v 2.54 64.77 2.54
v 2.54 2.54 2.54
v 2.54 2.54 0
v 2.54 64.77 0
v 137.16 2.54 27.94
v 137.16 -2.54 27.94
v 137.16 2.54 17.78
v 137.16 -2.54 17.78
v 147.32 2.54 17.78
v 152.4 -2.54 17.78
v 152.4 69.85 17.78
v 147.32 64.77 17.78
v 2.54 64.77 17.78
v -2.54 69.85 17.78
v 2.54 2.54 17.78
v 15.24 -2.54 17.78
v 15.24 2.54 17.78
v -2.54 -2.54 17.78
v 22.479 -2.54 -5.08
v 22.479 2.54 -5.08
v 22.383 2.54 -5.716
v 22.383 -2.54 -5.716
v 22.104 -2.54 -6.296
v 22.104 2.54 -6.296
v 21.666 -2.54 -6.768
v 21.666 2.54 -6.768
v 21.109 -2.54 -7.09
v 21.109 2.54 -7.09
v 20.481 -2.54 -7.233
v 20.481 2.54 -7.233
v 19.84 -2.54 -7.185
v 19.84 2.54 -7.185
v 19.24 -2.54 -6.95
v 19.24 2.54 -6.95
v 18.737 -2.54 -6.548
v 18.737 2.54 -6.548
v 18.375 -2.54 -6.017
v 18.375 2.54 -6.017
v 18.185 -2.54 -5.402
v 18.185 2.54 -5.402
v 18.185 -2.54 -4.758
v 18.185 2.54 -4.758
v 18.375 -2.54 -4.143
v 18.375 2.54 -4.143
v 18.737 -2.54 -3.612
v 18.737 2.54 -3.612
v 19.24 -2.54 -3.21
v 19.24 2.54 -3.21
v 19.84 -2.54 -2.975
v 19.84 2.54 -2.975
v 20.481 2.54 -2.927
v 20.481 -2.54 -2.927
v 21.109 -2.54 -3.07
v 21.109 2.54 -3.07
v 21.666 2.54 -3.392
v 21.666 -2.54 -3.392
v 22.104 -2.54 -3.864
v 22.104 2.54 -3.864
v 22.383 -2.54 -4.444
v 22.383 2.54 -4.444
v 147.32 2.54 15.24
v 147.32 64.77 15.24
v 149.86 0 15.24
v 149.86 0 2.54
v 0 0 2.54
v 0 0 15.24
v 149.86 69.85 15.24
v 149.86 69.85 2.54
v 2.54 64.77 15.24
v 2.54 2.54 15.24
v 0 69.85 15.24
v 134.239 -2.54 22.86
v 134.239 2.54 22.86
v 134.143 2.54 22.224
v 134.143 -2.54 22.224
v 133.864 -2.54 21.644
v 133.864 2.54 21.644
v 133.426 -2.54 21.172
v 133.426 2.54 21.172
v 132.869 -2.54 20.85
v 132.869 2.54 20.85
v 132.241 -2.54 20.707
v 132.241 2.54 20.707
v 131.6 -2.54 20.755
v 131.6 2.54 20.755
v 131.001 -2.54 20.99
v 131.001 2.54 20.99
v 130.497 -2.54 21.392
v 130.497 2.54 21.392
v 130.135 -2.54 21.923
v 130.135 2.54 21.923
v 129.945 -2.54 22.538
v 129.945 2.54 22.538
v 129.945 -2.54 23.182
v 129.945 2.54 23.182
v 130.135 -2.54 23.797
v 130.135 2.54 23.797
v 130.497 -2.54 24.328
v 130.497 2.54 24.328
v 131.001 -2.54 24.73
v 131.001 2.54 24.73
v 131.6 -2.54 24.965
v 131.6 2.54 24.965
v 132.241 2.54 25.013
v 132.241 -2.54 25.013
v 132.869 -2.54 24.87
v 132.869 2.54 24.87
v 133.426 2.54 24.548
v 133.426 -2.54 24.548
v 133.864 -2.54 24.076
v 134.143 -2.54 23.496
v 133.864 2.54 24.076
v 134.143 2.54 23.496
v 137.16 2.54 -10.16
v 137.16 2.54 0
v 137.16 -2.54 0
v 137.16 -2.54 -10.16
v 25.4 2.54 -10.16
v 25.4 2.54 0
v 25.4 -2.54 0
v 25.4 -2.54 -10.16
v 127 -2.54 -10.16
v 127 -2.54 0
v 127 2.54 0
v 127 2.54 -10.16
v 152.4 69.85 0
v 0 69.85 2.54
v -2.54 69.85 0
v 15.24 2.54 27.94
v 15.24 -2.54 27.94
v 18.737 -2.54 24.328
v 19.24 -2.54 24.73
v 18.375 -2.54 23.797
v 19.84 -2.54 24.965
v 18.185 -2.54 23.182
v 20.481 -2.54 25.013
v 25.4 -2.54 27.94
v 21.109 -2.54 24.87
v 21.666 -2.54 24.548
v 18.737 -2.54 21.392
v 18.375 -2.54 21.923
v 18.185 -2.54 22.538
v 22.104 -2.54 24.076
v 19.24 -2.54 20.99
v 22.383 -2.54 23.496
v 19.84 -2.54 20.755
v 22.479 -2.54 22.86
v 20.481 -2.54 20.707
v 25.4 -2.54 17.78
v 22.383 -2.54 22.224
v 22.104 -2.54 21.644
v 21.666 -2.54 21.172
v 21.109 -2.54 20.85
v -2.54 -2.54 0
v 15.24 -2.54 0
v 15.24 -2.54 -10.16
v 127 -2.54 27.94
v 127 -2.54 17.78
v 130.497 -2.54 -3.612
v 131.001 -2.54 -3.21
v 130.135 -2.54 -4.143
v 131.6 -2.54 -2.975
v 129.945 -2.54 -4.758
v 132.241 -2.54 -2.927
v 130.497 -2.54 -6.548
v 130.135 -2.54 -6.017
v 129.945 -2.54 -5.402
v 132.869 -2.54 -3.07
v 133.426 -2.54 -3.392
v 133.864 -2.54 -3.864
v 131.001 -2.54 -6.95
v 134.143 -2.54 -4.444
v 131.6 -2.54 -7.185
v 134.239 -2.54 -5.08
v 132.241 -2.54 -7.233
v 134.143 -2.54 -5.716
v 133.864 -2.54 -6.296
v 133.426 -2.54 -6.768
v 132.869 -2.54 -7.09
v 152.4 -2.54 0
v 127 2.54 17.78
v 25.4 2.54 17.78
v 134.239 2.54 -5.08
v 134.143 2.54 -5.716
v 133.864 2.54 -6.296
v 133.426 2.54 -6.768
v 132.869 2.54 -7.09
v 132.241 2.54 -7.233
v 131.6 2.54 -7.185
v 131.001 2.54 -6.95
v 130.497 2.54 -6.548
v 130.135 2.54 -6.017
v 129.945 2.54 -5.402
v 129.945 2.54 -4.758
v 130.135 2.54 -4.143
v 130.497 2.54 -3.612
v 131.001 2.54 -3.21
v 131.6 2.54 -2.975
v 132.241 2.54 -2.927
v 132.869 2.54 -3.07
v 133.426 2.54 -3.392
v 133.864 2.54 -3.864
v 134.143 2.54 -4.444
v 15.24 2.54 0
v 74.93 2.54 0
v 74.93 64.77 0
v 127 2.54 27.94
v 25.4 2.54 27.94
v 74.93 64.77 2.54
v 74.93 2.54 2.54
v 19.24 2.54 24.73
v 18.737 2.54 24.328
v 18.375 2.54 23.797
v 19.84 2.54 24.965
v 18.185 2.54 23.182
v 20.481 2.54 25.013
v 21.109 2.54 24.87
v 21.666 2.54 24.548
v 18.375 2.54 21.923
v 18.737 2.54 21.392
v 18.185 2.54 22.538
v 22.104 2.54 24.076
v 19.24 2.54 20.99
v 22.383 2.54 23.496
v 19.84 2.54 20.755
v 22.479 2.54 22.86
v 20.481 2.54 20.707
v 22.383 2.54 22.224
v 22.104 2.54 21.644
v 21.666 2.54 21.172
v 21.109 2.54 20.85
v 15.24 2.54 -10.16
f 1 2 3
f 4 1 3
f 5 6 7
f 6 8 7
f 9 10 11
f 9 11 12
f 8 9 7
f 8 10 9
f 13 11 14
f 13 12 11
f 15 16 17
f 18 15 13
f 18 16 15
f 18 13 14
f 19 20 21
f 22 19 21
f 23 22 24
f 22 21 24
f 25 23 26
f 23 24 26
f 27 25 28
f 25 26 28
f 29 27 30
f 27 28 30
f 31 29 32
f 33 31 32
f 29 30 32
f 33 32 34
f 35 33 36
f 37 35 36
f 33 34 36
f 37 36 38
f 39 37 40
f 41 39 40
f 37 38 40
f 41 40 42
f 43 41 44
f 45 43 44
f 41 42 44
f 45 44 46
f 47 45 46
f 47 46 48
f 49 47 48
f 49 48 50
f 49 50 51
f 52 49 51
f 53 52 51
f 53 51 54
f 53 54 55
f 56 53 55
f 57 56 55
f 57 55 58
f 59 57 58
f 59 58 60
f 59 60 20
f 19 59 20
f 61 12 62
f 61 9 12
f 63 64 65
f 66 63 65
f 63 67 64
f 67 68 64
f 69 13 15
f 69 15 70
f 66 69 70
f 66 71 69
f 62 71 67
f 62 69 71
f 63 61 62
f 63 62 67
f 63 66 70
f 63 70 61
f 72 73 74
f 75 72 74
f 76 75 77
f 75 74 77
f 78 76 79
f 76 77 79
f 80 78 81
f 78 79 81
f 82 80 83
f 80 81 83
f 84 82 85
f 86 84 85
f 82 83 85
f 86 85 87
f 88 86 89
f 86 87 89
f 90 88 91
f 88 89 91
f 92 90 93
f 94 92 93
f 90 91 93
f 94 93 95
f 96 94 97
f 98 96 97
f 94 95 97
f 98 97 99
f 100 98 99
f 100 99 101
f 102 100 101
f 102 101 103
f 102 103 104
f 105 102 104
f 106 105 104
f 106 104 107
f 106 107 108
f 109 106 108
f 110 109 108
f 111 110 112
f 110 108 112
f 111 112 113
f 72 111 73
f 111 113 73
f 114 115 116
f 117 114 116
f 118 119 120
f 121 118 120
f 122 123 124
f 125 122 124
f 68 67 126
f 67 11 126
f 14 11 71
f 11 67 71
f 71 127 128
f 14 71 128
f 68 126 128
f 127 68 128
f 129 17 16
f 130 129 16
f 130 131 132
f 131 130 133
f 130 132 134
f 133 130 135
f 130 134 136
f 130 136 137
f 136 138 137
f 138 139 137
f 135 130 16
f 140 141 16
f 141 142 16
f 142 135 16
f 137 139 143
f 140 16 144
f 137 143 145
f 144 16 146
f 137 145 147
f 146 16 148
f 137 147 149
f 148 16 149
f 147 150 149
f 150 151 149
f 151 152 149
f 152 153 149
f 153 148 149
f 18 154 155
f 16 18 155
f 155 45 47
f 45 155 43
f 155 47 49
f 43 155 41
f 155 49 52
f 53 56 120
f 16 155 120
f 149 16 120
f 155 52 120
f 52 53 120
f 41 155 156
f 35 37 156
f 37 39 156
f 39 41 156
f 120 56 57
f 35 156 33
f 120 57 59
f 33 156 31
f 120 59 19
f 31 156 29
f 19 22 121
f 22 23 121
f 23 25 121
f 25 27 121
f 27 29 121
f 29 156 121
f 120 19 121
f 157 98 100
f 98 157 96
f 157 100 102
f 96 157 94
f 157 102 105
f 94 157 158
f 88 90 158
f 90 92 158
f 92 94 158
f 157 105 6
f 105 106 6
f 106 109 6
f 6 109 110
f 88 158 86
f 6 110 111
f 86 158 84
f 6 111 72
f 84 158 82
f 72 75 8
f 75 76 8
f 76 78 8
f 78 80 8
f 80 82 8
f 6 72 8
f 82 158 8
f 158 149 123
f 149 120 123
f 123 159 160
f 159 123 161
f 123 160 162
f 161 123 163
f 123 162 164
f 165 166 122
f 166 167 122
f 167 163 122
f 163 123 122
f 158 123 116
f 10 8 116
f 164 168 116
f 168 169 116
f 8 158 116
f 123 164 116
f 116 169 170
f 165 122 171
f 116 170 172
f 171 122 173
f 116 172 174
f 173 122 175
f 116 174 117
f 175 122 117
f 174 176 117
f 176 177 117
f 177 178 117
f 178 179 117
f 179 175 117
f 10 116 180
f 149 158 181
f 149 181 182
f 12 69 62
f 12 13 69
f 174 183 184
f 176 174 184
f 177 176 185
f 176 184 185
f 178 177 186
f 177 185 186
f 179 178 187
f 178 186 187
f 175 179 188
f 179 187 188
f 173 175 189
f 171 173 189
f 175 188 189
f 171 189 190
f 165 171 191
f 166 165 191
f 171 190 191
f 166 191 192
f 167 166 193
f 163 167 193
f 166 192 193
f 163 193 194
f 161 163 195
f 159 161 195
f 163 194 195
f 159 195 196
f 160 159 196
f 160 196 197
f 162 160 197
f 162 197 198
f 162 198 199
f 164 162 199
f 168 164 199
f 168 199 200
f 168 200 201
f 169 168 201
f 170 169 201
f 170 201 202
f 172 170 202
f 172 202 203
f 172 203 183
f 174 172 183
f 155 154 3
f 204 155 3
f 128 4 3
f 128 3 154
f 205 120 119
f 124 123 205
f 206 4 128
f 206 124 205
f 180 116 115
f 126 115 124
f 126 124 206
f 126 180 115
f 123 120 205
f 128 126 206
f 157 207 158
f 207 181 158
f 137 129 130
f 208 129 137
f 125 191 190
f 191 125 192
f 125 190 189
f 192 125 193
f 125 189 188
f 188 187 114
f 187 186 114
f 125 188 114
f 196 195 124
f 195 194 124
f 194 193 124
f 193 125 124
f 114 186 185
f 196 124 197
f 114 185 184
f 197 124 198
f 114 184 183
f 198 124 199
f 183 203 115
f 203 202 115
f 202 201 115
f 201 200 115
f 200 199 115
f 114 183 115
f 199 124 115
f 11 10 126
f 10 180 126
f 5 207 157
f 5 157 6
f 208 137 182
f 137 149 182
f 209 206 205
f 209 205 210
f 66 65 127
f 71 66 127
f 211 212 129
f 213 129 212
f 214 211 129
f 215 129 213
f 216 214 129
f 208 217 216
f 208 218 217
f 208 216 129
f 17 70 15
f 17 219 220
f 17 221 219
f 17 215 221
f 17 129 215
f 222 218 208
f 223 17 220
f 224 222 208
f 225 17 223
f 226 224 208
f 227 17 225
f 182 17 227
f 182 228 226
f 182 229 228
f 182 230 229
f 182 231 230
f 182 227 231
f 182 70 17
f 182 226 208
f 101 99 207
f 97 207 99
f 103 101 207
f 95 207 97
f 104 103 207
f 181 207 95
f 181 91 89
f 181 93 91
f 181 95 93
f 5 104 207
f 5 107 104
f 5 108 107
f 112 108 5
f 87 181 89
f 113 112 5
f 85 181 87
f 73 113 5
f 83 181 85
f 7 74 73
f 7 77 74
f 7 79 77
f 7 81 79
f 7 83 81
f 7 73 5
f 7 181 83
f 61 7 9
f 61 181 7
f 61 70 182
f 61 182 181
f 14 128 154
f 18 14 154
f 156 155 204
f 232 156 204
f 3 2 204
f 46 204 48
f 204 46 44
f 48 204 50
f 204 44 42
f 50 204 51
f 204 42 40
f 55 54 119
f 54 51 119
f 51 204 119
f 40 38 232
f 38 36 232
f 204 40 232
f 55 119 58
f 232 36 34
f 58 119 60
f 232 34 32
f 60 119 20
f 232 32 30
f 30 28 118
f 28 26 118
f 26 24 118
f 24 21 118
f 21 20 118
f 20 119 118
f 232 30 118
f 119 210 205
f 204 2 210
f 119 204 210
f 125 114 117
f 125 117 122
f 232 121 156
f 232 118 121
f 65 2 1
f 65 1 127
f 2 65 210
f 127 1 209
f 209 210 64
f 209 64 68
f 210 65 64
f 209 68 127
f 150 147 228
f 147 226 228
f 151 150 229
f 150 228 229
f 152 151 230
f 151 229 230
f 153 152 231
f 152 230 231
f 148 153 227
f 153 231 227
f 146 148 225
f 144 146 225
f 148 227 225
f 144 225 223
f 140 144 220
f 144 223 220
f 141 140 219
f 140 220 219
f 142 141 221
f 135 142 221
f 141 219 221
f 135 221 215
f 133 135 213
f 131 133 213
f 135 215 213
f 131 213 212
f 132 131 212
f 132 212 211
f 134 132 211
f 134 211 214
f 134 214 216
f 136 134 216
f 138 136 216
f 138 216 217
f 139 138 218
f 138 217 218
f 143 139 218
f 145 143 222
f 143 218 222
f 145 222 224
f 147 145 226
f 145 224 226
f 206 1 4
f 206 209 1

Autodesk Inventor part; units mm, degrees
ref_plane "YZ Plane" through (0, 0, 0) normal (1, 0, 0) x (0, 1, 0)
ref_plane "XZ Plane" through (0, 0, 0) normal (0, 1, 0) x (-1, 0, 0)
ref_plane "XY Plane" through (0, 0, 0) normal (0, 0, 1) x (1, 0, 0)
sketch "Sketch1" plane through (0, 0, 0) normal (0, 0, 1) x (1, 0, 0)
  line L0 (0, 0) -> (0, 67.31)
  line L1 (0, 67.31) -> (149.86, 67.31)
  line L2 (149.86, 67.31) -> (149.86, 0)
  line L3 (149.86, 0) -> (0, 0)
  line L4 (-2.54, 69.85) -> (-2.54, -2.54)
  line L5 (-2.54, -2.54) -> (152.4, -2.54)
  line L6 (152.4, -2.54) -> (152.4, 69.85)
  line L7 (152.4, 69.85) -> (-2.54, 69.85)
  dimension "d0" = 67.31
  dimension "d1" = 149.86
  dimension "d5" = 72.39
  dimension "d6" = 154.94
  dimension "d7" = 72.39
extrude "Extrusion1" add sketch "Sketch1" along normal blind 17.78
sketch "Sketch2" plane through (0, 0, 0) normal (1, 0, 0) x (0, 0, -1)
  line L0 (0, 0) -> (-2.54, 0)
  line L1 (0, 0) -> (-17.78, 0) projected
  line L2 (-2.54, 0) -> (-2.54, 67.31)
  line L3 (0, 67.31) -> (-17.78, 67.31) projected
  line L4 (-2.54, 67.31) -> (0, 67.31)
  line L5 (0, 67.31) -> (0, 0)
  line L6 (0, 67.31) -> (0, 0) projected
  dimension "d10" = 2.54
extrude "Extrusion2" add sketch "Sketch2" along normal blind 2.54
sketch "Sketch3" plane through (0, 0, 17.78) normal (0, 1, 0) x (1, 0, 0)
  line L0 (0, 15.24) -> (0, 0) projected
  line L1 (0, 2.54) -> (149.86, 2.54)
  line L2 (149.86, 2.54) -> (149.86, 0)
  line L3 (149.86, 0) -> (0, 0)
  line L4 (0, 0) -> (149.86, 0) projected
  point P0 (0, 17.78)
extrude "Extrusion3" add sketch "Sketch3" along normal blind 2.54
sketch "Sketch4" plane through (-2.54, 69.85, 0) normal (0, 1, 0) x (1, 0, 0)
  line L0 (2.54, -15.24) -> (2.54, -2.54)
  line L1 (2.54, -2.54) -> (2.54, -15.24) projected
  line L2 (2.54, -2.54) -> (152.4, -2.54)
  line L3 (152.4, 0) -> (152.4, -15.24) projected
  line L4 (152.4, -15.24) -> (2.54, -15.24)
  point P0 (2.54, 0)
extrude "Extrusion4" cut sketch "Sketch4" against normal blind 2.54
sketch "Sketch5" plane through (0, 67.31, 17.78) normal (0, -1, 0) x (1, 0, 0)
  line L0 (149.86, 0) -> (149.86, -2.54)
  line L1 (149.86, -2.54) -> (0, -2.54)
  line L2 (0, -2.54) -> (0, 0)
  line L3 (0, 0) -> (149.86, 0)
  point P0 (0, -17.78)
extrude "Extrusion5" add sketch "Sketch5" along normal blind 2.54
sketch "Sketch6" plane through (0, 0, 2.54) normal (1, 0, 0) x (0, 0, -1)
  line L0 (-12.7, 2.54) -> (-15.24, 2.54)
  line L1 (-15.24, 2.54) -> (-15.24, 64.77)
  line L2 (-15.24, -2.54) -> (-15.24, 69.85) projected
  line L3 (-15.24, 64.77) -> (-12.7, 64.77)
  line L4 (-12.7, 64.77) -> (-12.7, 2.54)
  point P0 (2.54, 0)
  dimension "d19" = 62.23
extrude "Extrusion6" add sketch "Sketch6" along normal blind 2.54
sketch "Sketch7" plane through (0, 2.54, 17.78) normal (0, 1, 0) x (1, 0, 0)
  line L0 (149.86, 2.54) -> (149.86, 0)
  line L1 (149.86, 0) -> (147.32, 0)
  line L2 (149.86, 0) -> (2.54, 0) projected
  line L3 (147.32, 0) -> (147.32, 2.54)
  line L4 (147.32, 2.54) -> (149.86, 2.54)
  point P0 (0, 17.78)
  dimension "d22" = 2.54
extrude "Extrusion7" add sketch "Sketch7" along normal blind 62.23
sketch "Sketch8" plane through (149.86, 0, 0) normal (-1, 0, 0) x (0, 0, 1)
  line L0 (0, 0) -> (2.54, 0)
  line L1 (2.54, 0) -> (2.54, 2.54)
  line L2 (2.54, 69.85) -> (2.54, 0) projected
  line L3 (2.54, 2.54) -> (0, 2.54)
  line L4 (0, 0) -> (0, 67.31) projected
  dimension "d25" = 2.54
extrude "Extrusion8" add sketch "Sketch8" along normal blind 149.86
sketch "Sketch9" plane through (149.86, 67.31, 2.54) normal (-1, 0, 0) x (0, 0, 1)
  line L0 (-2.54, 0) -> (0, 0)
  line L1 (0, 0) -> (0, -2.54)
  line L2 (0, 0) -> (0, -64.77) projected
  line L3 (0, -2.54) -> (-2.54, -2.54)
  line L4 (-2.54, -64.77) -> (-2.54, 0) projected
  point P0 (-2.54, -67.31)
  point P1 (0, -67.31)
  dimension "d28" = 2.54
  dimension "d29" = 2.54
extrude "Extrusion9" add sketch "Sketch9" along normal blind 149.86
sketch "Sketch10" plane through (149.86, 0, 15.24) normal (-1, 0, 0) x (0, 0, 1)
  line L0 (-15.24, 2.54) -> (-12.7, 2.54)
  line L1 (-12.7, 2.54) -> (-12.7, 64.77)
  line L2 (-12.7, 64.77) -> (-15.24, 64.77)
  line L3 (-15.24, -2.54) -> (-15.24, 69.85) projected
  point P0 (-15.24, 0)
extrude "Extrusion10" add sketch "Sketch10" along normal blind 74.93
sketch "Sketch11" plane through (0, 0, 17.78) normal (0, 0, 1) x (1, 0, 0)
  line L0 (147.32, 2.54) -> (2.54, 2.54) projected
  line L1 (15.24, 2.54) -> (15.24, -2.54)
  line L2 (-2.54, -2.54) -> (152.4, -2.54) projected
  line L3 (15.24, -2.54) -> (25.4, -2.54)
  line L4 (25.4, -2.54) -> (25.4, 2.54)
  point P0 (0, 0)
  dimension "d34" = 10.16
extrude "Extrusion11" add sketch "Sketch11" along normal blind 10.16
sketch "Sketch12" plane through (0, 2.54, 17.78) normal (0, 1, 0) x (1, 0, 0)
  line L0 (15.24, 0) -> (15.24, -5.08)
  line L1 (15.24, 0) -> (15.24, -10.16) projected
  line L2 (15.24, -5.08) -> (20.32, -5.08)
  circle A0 centre (20.32, -5.08) radius 2.159
  point P0 (0, 17.78)
  dimension "d37" = 5.08
  dimension "d38" = 5.08
  dimension "d39" = 4.318
extrude "Extrusion12" cut sketch "Sketch12" against normal blind 10.16
sketch "Sketch13" plane through (0, 0, 17.78) normal (0, 0, 1) x (1, 0, 0)
  line L0 (149.86, 0) -> (137.16, 0)
  line L1 (0, 0) -> (149.86, 0) projected
  line L2 (137.16, 0) -> (137.16, 2.54)
  line L3 (147.32, 2.54) -> (2.54, 2.54) projected
  line L4 (137.16, 2.54) -> (127, 2.54)
  line L5 (127, 2.54) -> (127, -2.54)
  line L6 (25.4, -2.54) -> (152.4, -2.54) projected
  line L7 (137.16, -2.54) -> (137.16, 0)
  dimension "d42" = 12.7
  dimension "d43" = 10.16
extrude "Extrusion13" add sketch "Sketch13" along normal blind 10.16
sketch "Sketch14" plane through (0, 2.54, 17.78) normal (0, 1, 0) x (1, 0, 0)
  line L0 (127, 0) -> (127, -5.08)
  line L1 (127, 0) -> (127, -10.16) projected
  line L2 (127, -5.08) -> (132.08, -5.08)
  circle A0 centre (132.08, -5.08) radius 2.159
  point P0 (0, 17.78)
  dimension "d46" = 5.08
  dimension "d47" = 5.08
  dimension "d48" = 4.318
extrude "Extrusion14" cut sketch "Sketch14" against normal blind 10.16
sketch "Sketch15" plane through (0, 0, 0) normal (0, 0, -1) x (-1, 0, 0)
  line L0 (0, 0) -> (-149.86, 0) projected
  line L1 (-15.24, 0) -> (-15.24, 2.54)
  line L2 (-74.93, 2.54) -> (-2.54, 2.54) projected
  line L3 (-15.24, 2.54) -> (-25.4, 2.54)
  line L4 (-25.4, 2.54) -> (-25.4, -2.54)
  line L5 (-15.24, -2.54) -> (-25.4, -2.54) projected
  line L6 (-25.4, -2.54) -> (-15.24, -2.54)
  line L7 (-15.24, -2.54) -> (-15.24, 2.54)
  dimension "d51" = 10.16
extrude "Extrusion15" add sketch "Sketch15" along normal blind 10.16
sketch "Sketch16" plane through (2.54, 2.54, 2.54) normal (0, 1, 0) x (1, 0, 0)
  line L0 (12.7, 2.54) -> (12.7, 7.62)
  line L1 (12.7, 2.54) -> (12.7, 12.7) projected
  line L2 (12.7, 7.62) -> (17.78, 7.62)
  circle A0 centre (17.78, 7.62) radius 2.159
  point P0 (-2.54, 2.54)
  dimension "d54" = 5.08
  dimension "d55" = 5.08
  dimension "d56" = 4.318
extrude "Extrusion16" cut sketch "Sketch16" against normal blind 10.16
sketch "Sketch17" plane through (0, 0, 0) normal (0, 0, -1) x (-1, 0, 0)
  line L0 (-149.86, 69.85) -> (-149.86, 0) projected
  line L1 (-149.86, 2.54) -> (-137.16, 2.54)
  line L2 (-137.16, 2.54) -> (-147.32, 2.54) projected
  line L3 (-137.16, 2.54) -> (-137.16, -2.54)
  line L4 (0, 0) -> (-149.86, 0) projected
  line L5 (-137.16, -2.54) -> (-127, -2.54)
  line L6 (-127, -2.54) -> (-137.16, -2.54) projected
  line L7 (-127, -2.54) -> (-127, 2.54)
  line L8 (-127, 2.54) -> (-137.16, 2.54)
  line L9 (-137.16, 2.54) -> (-127, 2.54) projected
  dimension "d59" = 12.7
  dimension "d60" = 10.16
extrude "Extrusion17" add sketch "Sketch17" along normal blind 10.16 contours L4 L7 L5 L3 | L3 L8 L7 L4
sketch "Sketch18" plane through (127, 2.54, 0) normal (0, 1, 0) x (1, 0, 0)
  line L0 (0, 0) -> (0, 5.08)
  line L1 (0, 0) -> (0, 10.16) projected
  line L2 (0, 5.08) -> (5.08, 5.08)
  circle A0 centre (5.08, 5.08) radius 2.159
  point P0 (-127, 0)
  dimension "d63" = 5.08
  dimension "d64" = 5.08
  dimension "d65" = 4.318
extrude "Extrusion18" cut sketch "Sketch18" against normal blind 10.16
properties part number "PhoneCase"
